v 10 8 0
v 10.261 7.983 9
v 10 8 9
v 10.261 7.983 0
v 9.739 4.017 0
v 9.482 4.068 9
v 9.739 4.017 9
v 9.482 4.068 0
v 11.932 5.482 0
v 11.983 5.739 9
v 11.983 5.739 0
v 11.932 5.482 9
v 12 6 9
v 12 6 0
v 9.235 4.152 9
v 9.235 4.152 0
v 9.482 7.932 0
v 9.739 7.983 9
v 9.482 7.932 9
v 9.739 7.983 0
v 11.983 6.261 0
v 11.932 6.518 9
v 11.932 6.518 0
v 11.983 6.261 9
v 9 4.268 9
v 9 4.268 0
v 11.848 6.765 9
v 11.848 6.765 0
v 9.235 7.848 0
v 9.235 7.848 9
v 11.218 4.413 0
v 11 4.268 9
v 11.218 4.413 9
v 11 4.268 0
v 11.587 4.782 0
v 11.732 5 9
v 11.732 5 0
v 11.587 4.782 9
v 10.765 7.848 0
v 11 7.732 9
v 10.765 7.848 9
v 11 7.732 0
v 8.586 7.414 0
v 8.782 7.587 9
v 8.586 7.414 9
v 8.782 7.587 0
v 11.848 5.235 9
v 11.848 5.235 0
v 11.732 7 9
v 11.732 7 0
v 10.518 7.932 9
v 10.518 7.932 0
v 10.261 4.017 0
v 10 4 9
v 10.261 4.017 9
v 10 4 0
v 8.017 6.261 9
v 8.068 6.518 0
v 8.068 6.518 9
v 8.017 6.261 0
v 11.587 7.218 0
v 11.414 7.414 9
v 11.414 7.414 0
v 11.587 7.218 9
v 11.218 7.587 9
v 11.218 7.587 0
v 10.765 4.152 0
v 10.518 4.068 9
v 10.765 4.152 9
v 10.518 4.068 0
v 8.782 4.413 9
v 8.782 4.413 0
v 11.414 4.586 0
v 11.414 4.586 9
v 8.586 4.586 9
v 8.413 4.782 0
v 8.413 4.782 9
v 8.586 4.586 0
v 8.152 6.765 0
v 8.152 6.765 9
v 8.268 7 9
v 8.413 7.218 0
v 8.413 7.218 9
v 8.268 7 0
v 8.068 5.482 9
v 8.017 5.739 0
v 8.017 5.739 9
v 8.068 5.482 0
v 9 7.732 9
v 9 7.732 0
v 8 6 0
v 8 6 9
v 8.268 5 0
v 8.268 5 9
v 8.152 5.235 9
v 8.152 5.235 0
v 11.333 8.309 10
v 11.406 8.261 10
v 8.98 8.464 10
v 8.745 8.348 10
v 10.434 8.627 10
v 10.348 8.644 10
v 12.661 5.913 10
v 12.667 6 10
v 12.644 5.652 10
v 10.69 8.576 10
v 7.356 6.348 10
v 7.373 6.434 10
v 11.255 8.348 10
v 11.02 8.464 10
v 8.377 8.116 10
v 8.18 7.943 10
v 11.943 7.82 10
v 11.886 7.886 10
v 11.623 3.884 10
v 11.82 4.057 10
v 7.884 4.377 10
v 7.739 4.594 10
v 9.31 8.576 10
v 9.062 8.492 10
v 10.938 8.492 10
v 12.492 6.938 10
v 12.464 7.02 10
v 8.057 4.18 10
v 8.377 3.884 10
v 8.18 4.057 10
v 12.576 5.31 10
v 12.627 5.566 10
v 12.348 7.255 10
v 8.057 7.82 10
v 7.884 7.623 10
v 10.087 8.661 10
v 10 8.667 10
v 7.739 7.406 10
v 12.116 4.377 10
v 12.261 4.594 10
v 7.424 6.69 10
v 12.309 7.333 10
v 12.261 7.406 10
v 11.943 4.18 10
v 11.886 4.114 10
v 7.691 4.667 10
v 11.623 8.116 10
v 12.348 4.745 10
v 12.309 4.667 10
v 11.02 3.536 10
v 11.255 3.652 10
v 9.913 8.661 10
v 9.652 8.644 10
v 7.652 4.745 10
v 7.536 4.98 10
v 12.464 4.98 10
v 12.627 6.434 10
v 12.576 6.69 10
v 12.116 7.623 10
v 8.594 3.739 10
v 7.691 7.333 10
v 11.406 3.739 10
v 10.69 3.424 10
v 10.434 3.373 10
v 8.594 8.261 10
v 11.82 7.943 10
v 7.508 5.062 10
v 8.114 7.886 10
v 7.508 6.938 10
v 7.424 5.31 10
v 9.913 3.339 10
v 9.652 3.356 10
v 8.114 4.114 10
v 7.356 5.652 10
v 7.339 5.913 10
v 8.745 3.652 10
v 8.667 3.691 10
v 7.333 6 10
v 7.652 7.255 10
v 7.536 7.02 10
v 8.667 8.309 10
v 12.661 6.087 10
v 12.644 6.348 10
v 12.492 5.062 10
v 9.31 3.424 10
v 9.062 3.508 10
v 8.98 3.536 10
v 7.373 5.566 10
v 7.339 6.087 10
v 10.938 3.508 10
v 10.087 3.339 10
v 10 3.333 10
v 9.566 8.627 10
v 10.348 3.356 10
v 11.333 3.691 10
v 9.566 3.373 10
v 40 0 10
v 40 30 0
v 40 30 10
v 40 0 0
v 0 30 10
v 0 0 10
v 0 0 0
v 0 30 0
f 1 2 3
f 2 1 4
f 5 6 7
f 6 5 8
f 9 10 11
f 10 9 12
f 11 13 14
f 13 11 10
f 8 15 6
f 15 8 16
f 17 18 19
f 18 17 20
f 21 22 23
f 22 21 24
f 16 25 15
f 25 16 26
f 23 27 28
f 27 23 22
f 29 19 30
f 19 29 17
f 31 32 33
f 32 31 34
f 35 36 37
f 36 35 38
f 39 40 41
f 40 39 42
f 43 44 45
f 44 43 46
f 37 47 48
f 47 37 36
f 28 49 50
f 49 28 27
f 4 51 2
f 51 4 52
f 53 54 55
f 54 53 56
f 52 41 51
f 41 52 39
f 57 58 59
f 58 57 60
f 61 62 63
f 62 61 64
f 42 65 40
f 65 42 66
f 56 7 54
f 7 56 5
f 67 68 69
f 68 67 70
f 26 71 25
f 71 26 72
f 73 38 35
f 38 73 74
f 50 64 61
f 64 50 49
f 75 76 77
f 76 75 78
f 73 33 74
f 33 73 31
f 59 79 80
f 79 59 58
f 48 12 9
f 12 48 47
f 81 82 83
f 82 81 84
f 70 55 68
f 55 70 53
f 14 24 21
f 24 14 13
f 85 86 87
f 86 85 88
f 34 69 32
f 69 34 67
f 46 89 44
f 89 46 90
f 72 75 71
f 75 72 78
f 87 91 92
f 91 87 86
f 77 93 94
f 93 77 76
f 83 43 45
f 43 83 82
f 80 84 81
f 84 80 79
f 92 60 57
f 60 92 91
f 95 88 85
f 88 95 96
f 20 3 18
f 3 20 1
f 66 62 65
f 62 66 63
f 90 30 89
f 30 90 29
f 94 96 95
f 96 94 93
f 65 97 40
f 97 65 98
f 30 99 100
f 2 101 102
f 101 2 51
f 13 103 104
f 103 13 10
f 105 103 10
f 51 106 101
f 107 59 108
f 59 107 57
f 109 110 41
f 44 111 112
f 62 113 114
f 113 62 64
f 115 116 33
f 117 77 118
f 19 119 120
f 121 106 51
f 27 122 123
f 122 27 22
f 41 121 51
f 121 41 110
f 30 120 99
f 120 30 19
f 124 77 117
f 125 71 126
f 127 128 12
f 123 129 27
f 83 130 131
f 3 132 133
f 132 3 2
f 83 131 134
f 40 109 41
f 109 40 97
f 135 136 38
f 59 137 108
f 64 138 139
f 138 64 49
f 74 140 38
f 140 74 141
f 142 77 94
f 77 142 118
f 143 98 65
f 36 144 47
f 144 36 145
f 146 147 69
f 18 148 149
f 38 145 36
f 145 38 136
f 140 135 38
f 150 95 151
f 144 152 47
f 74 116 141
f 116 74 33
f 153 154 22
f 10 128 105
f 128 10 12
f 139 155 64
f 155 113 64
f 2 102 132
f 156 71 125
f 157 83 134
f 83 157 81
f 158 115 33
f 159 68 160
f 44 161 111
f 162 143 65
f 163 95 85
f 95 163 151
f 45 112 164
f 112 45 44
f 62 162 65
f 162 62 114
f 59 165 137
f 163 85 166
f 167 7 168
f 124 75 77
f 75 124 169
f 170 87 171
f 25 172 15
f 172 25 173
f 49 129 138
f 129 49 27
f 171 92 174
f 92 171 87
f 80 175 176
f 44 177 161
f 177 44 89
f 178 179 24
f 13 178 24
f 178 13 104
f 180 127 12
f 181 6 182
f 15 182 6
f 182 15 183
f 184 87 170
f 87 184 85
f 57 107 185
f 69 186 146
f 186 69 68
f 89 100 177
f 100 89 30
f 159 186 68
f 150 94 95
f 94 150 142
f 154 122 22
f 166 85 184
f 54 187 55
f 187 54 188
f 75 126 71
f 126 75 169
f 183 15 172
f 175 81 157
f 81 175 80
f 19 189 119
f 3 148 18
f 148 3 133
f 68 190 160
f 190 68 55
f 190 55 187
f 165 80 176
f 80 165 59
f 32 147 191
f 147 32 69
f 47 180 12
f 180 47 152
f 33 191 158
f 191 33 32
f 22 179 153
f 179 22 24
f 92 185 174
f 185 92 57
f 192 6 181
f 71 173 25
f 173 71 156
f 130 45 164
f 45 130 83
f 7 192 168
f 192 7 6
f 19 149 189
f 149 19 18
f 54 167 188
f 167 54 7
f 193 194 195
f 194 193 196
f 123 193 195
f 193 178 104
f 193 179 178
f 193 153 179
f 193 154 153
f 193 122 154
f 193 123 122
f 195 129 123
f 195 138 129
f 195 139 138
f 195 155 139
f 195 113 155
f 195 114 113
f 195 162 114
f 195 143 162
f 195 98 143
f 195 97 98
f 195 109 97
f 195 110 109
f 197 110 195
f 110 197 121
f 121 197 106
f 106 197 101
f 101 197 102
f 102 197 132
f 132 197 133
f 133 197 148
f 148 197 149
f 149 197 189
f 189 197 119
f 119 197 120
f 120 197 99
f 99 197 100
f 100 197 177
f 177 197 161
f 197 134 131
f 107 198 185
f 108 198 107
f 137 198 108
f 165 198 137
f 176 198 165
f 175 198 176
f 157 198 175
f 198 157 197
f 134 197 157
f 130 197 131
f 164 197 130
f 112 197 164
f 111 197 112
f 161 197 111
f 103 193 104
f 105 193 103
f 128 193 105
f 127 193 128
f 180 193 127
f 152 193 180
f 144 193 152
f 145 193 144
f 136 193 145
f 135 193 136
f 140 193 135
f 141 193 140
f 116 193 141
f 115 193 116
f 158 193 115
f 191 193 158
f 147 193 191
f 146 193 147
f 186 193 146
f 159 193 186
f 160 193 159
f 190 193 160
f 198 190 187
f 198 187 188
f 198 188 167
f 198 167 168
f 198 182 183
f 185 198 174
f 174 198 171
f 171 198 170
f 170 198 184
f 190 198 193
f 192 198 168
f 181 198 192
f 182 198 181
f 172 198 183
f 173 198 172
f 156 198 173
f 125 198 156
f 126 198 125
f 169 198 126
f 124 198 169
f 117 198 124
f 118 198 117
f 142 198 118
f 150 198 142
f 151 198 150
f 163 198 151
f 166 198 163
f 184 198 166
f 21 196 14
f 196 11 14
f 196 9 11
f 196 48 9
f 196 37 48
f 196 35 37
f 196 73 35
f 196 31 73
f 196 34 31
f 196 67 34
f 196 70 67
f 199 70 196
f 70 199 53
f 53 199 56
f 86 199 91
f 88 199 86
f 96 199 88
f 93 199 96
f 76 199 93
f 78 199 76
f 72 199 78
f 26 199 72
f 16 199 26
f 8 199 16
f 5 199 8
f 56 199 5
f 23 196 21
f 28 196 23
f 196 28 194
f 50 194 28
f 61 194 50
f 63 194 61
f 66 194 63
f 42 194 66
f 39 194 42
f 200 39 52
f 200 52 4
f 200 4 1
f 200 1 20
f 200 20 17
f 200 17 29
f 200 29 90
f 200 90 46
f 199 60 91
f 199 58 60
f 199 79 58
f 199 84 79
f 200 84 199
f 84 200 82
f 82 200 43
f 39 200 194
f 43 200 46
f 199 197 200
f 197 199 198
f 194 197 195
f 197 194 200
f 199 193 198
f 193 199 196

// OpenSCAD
// units=mm — generated by scad_emitter.py
// part=unnamed
$fn = 48;

difference() { cube([40, 30, 10]); union() { translate([10, 6, 10.5]) rotate([180, 0, 0]) cylinder(h=11, r=2, $fn=$fn); translate([10, 6, 10.5]) rotate([180, 0, 0]) cylinder(h=1.5, r1=3, r2=2, $fn=$fn); } }
